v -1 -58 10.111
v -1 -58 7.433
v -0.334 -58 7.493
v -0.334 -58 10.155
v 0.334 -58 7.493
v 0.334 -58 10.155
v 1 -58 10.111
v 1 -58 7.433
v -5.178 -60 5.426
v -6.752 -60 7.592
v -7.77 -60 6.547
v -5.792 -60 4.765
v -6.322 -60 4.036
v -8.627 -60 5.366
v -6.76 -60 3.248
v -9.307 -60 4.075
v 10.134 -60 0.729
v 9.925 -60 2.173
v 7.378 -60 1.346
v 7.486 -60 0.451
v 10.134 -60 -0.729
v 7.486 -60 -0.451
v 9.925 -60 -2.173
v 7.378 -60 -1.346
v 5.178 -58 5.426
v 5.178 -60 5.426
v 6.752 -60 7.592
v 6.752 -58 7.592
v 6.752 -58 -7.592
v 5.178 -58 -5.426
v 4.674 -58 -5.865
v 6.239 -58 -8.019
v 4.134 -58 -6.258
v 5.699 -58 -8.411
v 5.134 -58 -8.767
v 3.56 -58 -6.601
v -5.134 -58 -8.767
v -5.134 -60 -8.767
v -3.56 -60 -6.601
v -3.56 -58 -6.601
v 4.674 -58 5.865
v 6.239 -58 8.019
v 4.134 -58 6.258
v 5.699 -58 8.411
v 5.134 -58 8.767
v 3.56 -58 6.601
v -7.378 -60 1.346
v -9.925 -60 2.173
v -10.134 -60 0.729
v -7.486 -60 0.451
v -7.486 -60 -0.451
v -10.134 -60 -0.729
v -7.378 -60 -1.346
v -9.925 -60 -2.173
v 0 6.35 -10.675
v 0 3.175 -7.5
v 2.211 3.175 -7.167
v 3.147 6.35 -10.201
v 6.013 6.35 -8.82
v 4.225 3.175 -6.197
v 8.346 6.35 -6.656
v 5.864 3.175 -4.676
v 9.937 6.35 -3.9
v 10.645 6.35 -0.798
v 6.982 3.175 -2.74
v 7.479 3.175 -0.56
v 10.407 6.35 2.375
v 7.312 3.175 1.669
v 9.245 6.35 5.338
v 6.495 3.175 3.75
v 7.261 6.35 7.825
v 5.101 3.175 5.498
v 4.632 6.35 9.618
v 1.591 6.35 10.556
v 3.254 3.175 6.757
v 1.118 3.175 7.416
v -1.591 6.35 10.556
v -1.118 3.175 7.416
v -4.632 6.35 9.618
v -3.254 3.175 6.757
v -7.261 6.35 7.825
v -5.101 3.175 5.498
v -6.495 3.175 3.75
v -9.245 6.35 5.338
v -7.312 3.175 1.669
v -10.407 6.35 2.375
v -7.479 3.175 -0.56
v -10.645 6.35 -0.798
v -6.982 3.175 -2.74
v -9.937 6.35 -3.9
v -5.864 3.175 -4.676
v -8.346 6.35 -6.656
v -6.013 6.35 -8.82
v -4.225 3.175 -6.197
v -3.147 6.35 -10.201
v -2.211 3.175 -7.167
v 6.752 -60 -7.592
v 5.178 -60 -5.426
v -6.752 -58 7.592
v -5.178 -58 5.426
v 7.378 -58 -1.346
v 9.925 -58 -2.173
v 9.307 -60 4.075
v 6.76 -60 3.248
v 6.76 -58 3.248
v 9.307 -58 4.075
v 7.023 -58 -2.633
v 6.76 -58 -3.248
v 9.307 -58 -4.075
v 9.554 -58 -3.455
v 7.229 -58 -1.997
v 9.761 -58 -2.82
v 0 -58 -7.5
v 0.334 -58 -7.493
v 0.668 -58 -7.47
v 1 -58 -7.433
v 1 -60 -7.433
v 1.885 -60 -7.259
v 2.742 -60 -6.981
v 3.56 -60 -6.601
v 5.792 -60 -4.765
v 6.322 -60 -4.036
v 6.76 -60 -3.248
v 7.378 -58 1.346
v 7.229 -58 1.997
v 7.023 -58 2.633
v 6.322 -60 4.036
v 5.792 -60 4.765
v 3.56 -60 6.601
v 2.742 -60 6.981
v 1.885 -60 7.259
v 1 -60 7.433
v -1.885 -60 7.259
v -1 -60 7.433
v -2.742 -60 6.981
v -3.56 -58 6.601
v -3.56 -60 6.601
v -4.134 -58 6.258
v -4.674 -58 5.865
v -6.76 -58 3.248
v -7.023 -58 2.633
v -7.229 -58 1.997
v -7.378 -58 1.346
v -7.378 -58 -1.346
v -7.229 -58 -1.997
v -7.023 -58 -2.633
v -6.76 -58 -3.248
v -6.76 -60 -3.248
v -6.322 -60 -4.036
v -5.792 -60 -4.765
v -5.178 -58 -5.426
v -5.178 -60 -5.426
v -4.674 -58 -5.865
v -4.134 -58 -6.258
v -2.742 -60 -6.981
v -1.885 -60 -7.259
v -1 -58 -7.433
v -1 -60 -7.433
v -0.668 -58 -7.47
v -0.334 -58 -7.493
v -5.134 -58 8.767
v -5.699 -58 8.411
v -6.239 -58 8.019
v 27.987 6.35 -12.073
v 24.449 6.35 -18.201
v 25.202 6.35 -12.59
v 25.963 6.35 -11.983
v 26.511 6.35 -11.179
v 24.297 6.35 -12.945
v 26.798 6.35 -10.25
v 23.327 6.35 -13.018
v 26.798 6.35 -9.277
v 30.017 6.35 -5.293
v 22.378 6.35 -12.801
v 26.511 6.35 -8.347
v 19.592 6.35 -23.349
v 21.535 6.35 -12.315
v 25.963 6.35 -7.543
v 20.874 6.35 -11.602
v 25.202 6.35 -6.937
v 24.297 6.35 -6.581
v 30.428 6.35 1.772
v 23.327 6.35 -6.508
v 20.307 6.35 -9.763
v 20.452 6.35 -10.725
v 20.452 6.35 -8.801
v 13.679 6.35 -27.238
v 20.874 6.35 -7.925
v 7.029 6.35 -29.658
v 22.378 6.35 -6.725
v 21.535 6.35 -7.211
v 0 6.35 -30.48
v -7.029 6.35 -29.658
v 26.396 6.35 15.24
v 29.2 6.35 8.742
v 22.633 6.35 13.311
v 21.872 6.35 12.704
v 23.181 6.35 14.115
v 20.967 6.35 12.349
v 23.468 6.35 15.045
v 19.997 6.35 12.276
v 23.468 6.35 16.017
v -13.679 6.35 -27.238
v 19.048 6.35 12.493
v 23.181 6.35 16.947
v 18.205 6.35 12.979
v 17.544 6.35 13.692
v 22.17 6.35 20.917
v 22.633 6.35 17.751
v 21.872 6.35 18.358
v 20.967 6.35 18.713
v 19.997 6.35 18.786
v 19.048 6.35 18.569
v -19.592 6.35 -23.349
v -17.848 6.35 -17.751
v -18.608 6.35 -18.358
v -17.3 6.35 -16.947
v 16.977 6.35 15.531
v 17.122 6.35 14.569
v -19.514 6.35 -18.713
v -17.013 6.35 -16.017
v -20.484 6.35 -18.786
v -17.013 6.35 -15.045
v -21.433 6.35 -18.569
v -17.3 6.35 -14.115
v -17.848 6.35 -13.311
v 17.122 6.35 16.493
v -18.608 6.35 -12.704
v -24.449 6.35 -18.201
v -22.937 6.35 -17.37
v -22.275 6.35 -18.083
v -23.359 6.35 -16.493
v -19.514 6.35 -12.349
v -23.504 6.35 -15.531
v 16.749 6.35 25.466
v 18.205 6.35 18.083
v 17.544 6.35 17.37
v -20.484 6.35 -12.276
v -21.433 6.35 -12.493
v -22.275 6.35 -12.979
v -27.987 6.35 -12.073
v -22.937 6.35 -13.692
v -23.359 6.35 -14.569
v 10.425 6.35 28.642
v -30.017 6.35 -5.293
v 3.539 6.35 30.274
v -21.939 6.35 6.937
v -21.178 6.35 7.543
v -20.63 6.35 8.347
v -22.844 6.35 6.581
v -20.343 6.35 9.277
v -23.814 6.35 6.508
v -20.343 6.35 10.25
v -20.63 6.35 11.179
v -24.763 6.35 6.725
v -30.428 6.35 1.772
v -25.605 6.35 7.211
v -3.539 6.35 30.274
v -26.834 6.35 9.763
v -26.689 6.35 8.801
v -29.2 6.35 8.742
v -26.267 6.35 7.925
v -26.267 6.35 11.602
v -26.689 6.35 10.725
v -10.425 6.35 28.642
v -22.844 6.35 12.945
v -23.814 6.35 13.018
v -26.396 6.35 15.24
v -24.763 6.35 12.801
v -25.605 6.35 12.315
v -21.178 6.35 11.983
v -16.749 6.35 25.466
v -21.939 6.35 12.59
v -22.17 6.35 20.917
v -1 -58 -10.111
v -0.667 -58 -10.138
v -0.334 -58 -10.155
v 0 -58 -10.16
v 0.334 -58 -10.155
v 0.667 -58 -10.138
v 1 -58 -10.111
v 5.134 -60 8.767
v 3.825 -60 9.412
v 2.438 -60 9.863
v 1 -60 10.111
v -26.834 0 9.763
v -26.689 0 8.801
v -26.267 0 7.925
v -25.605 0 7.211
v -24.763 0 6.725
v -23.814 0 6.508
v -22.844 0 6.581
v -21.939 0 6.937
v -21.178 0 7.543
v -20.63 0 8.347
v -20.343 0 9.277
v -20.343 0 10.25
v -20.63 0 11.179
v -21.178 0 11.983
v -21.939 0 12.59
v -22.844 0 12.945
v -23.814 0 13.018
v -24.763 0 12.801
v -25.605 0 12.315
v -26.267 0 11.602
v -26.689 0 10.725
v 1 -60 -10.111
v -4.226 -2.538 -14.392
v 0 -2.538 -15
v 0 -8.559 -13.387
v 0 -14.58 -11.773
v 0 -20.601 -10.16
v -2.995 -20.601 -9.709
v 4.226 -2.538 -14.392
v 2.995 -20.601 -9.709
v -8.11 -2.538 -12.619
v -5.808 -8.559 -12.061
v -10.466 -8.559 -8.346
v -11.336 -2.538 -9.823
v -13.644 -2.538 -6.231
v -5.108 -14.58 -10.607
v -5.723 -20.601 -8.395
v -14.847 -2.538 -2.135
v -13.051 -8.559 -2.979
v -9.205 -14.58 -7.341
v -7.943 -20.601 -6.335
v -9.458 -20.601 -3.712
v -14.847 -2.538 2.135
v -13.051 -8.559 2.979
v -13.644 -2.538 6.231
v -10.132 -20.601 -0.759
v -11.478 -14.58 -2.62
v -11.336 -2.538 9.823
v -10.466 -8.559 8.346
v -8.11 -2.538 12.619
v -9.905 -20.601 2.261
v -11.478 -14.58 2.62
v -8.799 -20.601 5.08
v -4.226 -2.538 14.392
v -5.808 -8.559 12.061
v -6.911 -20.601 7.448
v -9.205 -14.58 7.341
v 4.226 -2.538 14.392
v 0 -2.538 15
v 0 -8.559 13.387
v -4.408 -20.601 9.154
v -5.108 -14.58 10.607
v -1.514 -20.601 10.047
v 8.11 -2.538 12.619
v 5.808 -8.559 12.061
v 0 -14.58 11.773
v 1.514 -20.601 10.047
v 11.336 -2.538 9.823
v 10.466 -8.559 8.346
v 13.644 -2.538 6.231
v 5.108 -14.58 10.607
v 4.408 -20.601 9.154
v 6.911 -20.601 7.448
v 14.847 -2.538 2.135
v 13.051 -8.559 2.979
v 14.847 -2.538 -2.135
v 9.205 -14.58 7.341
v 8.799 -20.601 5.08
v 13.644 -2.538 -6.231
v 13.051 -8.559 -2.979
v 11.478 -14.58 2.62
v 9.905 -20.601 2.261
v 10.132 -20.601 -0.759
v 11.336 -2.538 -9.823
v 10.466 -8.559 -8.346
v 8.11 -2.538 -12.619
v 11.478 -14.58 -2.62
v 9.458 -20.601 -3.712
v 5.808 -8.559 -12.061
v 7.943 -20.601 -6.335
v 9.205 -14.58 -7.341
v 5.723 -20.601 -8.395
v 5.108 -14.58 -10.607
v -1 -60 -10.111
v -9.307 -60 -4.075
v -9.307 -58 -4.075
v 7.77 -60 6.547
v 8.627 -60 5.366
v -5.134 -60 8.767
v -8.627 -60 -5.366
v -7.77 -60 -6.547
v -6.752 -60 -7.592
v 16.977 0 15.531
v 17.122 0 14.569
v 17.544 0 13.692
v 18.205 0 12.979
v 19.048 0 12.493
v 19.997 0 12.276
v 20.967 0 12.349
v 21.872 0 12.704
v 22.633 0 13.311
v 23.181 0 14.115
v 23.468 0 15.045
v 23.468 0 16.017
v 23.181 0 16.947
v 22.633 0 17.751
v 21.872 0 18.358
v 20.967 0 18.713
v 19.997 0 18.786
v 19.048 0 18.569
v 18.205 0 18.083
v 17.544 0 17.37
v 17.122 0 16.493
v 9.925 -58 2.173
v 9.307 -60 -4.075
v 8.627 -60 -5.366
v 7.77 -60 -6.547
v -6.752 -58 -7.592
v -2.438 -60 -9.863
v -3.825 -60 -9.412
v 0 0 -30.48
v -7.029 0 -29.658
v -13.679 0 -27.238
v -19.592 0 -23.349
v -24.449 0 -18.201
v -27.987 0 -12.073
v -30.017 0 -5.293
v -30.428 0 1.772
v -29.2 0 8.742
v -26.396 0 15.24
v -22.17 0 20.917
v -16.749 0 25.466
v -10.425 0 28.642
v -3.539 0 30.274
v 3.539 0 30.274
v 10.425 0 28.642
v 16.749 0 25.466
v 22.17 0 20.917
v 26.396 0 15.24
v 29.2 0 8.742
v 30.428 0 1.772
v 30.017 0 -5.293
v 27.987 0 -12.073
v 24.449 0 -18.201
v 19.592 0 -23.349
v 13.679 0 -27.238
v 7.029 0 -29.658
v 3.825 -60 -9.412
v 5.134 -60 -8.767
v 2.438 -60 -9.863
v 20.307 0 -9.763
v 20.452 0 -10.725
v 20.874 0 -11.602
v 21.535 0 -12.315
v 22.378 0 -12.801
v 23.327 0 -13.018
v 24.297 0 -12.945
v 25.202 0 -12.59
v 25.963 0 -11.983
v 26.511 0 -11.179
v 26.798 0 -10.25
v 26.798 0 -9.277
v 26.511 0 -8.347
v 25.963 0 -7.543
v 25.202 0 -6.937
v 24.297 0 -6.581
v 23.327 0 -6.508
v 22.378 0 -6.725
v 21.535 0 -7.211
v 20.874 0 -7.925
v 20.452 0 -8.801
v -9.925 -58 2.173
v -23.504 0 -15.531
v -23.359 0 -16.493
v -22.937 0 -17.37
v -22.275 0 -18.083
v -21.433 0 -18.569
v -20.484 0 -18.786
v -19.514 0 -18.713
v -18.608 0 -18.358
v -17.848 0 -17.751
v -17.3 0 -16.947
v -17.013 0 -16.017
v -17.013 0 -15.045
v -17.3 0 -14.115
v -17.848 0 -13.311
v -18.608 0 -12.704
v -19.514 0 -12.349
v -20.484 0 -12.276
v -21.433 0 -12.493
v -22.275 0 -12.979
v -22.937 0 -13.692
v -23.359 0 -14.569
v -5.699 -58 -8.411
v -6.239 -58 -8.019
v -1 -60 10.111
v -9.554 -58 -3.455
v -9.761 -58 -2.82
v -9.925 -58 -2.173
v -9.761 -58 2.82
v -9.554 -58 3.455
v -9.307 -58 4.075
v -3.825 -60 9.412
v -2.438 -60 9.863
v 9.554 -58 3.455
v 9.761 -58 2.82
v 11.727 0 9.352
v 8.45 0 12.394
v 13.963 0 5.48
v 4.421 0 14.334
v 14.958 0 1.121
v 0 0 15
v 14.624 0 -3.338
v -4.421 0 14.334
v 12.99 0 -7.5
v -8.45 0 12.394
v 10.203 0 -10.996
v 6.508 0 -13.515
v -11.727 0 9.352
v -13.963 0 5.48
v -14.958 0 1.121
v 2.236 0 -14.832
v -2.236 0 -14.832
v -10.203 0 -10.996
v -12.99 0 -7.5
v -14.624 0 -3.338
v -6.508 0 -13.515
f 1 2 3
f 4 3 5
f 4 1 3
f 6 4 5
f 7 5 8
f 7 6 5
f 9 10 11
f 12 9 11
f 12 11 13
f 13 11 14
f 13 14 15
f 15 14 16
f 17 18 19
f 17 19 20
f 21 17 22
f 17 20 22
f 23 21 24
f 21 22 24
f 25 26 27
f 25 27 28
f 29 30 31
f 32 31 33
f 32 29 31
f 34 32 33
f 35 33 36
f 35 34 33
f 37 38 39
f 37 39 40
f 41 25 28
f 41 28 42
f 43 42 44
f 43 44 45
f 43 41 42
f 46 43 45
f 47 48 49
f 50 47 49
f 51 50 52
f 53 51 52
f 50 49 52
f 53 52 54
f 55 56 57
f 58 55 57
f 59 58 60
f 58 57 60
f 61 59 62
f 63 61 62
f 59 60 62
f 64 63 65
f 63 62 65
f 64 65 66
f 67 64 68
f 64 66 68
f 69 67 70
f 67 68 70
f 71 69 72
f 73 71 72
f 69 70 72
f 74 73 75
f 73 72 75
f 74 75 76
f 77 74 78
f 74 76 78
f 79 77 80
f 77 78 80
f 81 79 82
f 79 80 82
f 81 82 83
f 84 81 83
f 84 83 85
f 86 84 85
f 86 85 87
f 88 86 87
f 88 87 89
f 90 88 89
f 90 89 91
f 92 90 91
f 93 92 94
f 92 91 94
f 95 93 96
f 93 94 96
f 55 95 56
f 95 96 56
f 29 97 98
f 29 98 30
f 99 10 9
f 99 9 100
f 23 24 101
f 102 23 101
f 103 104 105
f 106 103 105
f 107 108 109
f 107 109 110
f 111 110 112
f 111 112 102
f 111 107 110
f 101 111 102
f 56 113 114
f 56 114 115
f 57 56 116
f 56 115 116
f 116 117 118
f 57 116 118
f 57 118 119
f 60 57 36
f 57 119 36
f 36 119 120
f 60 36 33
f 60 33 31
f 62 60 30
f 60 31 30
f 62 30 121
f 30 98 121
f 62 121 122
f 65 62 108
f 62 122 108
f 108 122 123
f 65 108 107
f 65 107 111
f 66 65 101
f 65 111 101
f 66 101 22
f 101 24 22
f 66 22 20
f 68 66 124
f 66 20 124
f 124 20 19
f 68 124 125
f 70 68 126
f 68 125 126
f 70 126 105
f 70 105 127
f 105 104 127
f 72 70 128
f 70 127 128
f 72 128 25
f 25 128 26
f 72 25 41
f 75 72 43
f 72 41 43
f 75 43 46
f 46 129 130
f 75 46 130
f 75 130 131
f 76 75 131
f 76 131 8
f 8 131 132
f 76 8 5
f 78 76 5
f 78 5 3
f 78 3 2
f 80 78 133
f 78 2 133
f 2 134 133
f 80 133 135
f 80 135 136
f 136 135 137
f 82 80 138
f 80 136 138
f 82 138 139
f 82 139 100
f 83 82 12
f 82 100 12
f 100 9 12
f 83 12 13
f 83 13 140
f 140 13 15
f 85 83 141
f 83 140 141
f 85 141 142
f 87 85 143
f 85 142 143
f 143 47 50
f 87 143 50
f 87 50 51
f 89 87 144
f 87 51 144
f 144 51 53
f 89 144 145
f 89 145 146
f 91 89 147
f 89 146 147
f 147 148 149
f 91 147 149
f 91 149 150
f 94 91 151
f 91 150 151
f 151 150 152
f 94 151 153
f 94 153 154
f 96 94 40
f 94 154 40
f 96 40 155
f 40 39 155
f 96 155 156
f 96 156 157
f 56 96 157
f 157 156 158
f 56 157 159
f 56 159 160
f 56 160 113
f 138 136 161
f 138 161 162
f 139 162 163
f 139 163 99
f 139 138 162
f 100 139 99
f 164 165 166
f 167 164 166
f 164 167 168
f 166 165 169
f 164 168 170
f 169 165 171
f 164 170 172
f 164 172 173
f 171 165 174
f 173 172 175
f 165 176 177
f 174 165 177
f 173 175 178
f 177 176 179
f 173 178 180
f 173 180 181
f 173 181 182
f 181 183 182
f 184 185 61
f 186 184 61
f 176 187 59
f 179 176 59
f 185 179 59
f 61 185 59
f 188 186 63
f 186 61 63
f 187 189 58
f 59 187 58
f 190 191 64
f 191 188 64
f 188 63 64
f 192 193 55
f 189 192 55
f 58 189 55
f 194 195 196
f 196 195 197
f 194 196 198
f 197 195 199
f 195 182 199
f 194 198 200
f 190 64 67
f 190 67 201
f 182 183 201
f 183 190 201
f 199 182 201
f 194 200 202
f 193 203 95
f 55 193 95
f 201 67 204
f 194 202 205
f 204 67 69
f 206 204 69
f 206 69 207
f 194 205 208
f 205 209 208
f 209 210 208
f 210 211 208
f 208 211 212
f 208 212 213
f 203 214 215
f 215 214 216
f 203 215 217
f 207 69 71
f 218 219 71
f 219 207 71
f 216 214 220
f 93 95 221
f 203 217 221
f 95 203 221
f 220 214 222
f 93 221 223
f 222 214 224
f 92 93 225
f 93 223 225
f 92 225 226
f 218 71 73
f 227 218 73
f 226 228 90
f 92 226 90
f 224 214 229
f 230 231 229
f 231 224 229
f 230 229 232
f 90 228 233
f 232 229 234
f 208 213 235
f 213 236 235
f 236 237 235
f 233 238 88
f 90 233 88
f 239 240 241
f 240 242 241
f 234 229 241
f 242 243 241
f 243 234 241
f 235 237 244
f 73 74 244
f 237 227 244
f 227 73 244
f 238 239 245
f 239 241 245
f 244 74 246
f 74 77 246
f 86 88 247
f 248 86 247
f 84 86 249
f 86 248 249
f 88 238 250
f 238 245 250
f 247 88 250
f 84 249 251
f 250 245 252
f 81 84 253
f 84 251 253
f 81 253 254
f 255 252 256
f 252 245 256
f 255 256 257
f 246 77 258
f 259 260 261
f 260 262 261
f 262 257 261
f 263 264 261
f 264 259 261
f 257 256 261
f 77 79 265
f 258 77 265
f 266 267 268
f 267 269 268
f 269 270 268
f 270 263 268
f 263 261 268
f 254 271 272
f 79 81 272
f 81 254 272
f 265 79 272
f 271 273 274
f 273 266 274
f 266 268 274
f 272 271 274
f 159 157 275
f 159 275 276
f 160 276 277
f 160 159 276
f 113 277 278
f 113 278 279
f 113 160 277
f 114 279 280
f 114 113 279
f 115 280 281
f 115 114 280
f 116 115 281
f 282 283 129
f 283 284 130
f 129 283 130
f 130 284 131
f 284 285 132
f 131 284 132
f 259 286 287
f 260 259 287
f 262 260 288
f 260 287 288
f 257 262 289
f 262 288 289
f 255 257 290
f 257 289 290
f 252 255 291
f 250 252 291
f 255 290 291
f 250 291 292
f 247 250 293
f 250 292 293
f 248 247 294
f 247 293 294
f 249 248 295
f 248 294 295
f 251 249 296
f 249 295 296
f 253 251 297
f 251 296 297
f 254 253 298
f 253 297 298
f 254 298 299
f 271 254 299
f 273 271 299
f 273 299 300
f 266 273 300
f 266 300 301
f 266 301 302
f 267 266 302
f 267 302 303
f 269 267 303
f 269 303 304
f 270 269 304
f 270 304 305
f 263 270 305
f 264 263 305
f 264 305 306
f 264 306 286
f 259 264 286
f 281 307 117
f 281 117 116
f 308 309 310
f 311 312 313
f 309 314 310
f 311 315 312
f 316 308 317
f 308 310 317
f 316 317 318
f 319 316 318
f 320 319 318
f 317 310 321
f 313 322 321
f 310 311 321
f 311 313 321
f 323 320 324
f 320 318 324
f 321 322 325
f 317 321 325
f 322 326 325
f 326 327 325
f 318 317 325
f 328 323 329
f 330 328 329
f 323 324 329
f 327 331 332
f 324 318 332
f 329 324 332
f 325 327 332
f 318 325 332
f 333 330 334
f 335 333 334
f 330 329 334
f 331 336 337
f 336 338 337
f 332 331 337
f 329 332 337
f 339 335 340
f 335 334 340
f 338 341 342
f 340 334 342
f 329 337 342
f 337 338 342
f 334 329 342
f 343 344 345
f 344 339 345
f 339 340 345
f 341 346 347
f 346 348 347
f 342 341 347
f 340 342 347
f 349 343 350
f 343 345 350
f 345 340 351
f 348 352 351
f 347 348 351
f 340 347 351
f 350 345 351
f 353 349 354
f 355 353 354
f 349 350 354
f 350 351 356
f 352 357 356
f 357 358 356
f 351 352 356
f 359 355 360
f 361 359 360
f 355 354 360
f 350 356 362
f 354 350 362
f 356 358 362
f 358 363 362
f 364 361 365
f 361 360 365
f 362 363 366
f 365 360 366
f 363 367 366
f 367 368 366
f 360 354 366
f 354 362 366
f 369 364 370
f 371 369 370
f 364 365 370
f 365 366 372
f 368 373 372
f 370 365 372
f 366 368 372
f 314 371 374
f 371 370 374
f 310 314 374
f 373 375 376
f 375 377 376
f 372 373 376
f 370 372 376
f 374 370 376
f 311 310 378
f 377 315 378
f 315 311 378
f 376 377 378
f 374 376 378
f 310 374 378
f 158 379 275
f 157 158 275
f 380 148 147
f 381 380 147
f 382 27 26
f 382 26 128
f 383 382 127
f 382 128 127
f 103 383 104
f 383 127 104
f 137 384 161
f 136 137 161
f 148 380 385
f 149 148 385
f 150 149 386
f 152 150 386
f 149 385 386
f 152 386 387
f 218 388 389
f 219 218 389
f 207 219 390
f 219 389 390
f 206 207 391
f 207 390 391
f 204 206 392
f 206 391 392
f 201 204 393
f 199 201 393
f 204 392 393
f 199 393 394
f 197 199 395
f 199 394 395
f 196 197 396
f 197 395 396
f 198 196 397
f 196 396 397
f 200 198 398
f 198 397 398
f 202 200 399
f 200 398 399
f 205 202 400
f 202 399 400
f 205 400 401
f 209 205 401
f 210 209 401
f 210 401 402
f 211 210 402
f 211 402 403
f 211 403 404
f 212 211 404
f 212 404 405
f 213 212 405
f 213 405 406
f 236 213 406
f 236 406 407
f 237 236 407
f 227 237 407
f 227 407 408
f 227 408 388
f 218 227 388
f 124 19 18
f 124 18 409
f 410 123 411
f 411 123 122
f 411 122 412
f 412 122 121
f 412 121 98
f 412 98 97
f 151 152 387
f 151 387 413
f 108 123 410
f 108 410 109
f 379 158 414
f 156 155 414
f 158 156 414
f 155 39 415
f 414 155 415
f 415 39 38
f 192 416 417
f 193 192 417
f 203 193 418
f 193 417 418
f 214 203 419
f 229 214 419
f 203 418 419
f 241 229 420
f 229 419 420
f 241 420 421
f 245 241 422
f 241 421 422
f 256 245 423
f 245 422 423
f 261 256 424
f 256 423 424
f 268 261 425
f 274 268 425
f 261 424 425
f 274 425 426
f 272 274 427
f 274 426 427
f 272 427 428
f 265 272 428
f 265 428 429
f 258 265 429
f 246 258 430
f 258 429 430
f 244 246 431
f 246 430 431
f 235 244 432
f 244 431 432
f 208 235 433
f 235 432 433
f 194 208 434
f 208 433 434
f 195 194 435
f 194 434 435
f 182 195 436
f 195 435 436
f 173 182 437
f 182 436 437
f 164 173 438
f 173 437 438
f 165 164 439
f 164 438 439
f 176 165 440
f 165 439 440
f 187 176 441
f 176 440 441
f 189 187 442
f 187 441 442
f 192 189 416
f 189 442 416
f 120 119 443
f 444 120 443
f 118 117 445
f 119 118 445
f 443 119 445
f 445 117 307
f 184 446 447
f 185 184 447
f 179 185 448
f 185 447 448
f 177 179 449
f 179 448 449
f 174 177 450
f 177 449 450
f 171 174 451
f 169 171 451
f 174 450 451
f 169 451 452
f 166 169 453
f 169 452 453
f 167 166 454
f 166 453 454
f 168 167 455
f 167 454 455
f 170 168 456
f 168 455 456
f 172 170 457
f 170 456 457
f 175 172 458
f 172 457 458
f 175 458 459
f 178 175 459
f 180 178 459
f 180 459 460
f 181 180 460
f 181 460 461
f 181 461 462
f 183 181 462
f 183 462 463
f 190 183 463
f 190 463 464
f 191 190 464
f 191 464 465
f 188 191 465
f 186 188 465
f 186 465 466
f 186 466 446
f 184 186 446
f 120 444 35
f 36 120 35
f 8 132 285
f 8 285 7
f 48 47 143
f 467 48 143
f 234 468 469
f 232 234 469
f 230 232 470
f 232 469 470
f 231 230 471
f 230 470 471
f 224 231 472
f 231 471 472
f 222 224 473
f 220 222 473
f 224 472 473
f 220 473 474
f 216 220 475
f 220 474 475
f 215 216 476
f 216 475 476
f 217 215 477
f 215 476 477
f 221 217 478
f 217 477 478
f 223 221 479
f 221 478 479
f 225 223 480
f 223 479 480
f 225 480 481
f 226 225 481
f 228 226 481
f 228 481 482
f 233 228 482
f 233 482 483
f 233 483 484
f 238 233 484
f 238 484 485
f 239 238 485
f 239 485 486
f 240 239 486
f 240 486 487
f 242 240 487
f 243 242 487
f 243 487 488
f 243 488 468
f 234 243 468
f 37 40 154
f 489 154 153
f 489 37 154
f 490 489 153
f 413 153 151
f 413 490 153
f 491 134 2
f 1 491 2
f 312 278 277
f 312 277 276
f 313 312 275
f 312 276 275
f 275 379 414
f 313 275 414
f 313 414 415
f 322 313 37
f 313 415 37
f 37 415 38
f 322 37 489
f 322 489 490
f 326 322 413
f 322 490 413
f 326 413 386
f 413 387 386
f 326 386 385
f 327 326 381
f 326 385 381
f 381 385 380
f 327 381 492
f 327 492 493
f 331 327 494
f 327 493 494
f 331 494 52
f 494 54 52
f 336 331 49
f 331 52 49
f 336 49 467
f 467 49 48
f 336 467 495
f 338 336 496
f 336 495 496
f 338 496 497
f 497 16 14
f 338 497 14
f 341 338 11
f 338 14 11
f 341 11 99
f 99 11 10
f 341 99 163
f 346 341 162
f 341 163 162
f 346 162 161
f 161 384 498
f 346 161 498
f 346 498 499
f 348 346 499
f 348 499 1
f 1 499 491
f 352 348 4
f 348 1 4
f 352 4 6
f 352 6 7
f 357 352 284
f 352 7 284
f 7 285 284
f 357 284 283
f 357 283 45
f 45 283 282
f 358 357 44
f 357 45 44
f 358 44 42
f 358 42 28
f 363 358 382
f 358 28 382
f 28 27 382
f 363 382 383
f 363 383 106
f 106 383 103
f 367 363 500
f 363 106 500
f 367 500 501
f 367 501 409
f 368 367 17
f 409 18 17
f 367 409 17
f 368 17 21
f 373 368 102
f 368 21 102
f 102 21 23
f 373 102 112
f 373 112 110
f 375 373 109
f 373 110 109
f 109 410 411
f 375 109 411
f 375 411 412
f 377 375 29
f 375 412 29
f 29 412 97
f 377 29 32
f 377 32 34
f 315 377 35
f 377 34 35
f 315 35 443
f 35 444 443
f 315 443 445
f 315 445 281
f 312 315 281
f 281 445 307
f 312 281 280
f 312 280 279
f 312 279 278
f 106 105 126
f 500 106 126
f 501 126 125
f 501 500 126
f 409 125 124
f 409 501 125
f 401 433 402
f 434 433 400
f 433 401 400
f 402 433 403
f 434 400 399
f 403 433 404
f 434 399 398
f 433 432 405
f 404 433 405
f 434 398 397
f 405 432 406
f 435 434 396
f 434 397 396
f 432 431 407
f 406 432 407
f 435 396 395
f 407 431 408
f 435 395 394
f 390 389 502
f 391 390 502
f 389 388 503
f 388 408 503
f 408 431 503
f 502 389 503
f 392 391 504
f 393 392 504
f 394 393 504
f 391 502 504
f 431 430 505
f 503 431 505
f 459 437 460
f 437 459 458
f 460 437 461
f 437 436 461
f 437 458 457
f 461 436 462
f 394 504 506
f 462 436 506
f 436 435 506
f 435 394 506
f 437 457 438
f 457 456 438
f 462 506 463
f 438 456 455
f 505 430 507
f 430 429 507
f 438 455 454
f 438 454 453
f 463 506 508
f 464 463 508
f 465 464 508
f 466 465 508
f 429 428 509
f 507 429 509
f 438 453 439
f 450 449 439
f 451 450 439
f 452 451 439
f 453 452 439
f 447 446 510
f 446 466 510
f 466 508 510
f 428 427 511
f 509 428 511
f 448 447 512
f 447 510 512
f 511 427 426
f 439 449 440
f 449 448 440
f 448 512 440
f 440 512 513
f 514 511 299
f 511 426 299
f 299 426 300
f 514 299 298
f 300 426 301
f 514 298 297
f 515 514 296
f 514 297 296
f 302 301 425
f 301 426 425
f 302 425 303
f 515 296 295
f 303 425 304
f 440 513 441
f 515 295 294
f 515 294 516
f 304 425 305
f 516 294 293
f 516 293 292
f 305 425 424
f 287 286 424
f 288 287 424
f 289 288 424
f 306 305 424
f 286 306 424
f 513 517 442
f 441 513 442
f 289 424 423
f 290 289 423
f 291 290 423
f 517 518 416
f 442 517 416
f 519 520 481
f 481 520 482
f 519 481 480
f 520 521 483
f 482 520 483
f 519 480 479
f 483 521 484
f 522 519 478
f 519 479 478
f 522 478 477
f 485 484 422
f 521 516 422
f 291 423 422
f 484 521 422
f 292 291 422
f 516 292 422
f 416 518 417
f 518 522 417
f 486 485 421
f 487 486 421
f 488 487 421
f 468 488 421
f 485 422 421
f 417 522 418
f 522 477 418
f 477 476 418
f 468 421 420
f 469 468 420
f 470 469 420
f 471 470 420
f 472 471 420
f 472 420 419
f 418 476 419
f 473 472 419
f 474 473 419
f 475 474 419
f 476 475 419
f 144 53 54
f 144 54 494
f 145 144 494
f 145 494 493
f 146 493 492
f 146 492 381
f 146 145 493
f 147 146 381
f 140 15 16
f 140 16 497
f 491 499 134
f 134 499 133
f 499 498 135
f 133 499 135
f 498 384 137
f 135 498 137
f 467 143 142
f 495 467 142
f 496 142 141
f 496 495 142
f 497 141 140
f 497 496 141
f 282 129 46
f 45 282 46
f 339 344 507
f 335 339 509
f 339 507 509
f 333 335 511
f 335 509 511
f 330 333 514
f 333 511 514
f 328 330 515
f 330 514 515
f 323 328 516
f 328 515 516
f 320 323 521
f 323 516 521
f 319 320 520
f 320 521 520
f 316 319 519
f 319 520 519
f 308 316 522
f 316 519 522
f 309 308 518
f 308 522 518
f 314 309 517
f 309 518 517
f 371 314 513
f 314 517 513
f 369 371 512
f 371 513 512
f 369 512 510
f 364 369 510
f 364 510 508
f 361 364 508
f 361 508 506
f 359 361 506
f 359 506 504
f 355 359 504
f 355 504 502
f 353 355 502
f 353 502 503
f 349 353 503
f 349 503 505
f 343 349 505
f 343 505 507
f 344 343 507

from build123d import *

# Parameters (mm, degrees)
SKETCH5_R                   = 7.5
CUT_EXTRUDE1_DEPTH          = 90
SKETCH6_R                   = 3.5
CUT_EXTRUDE2_DEPTH          = 20
CIRPATTERN1_COUNT           = 6
SKETCH11_R                  = 3.18
CUT_EXTRUDE4_DEPTH          = 101.105860558
SKETCH23_R                  = 30.48
CUT_EXTRUDE6_DEPTH          = 80.122584091
F_1_4_CLEARANCE_HOLE1_D     = 6.5278
F_1_4_CLEARANCE_HOLE1_DEPTH = 15.4203
F_1_4_CLEARANCE_HOLE1_TIP   = 1.961148974
CHAMFER1_SIZE               = 3.175
SKETCH26_OUTSIDE_W          = 84.718
SKETCH26_OUTSIDE_H          = 84.718
SKETCH26_OUTSIDE_R          = 15
FOR_TURNING_EASE_DEPTH      = 74.878689756
SKETCH29_W                  = 2
SKETCH29_H                  = 2
CUT_EXTRUDE7_DEPTH          = 74.878689756
CIRPATTERN4_COUNT           = 5


with BuildPart() as part:
    # Sketch1 → Revolve1 (revolve)
    with BuildSketch(Plane(origin=(0, 0, 0), x_dir=(0, 0, -1), z_dir=(1, 0, 0))):
        Polygon((0, 30.35), (12.7, 30.35), (12.7, 6.35), (30.48, 6.35), (30.48, 0), (15.68, 0), (10.16, -20.600920458), (10.16, -60), (0, -60), align=None)
    revolve(axis=Axis((0, 0, 0), (0, 1, 0)))

    # Sketch5 → Cut-Extrude1 (cut)
    with BuildSketch(Plane.XZ.offset(60)):
        Circle(SKETCH5_R)
    extrude(amount=-CUT_EXTRUDE1_DEPTH, mode=Mode.SUBTRACT)

    # Sketch6 → Cut-Extrude2 (cut, symmetric)
    with BuildSketch(Plane.XY):
        with Locations((0, 16.659966967)):
            Circle(SKETCH6_R)
    cut_extrude2 = extrude(amount=CUT_EXTRUDE2_DEPTH, both=True, mode=Mode.SUBTRACT)

    # CirPattern1: Cut-Extrude2 ×6 about axis
    cirpattern1_axis = Axis((0, 30.35, 0), (0, -1, 0))
    for i in range(1, CIRPATTERN1_COUNT):
        add(cut_extrude2.rotate(cirpattern1_axis, i * 360 / CIRPATTERN1_COUNT), mode=Mode.SUBTRACT)

    # Sketch11 → Cut-Extrude4 (cut, through all)
    with BuildSketch(Plane(origin=(0, 30.35, 0), x_dir=(1, 0, 0), z_dir=(0, 1, 0))):
        Circle(SKETCH11_R)
    extrude(amount=-CUT_EXTRUDE4_DEPTH, mode=Mode.SUBTRACT)

    # Sketch23 → Cut-Extrude6 (cut, through all)
    with BuildSketch(Plane(origin=(0, 6.35, 0), x_dir=(1, 0, 0), z_dir=(0, 1, 0))):
        Circle(SKETCH23_R)
    extrude(amount=CUT_EXTRUDE6_DEPTH, mode=Mode.SUBTRACT)

    # 1/4 Clearance Hole1
    with Locations(Plane(origin=(0, 6.35, 0), x_dir=(1, 0, 0), z_dir=(0, 1, 0))):
        with Locations((-20.240427094, 15.531025958), (23.570476573, 9.763211068), (20.240427094, -15.531025958), (-23.570476573, -9.763211068)):
            Hole(F_1_4_CLEARANCE_HOLE1_D / 2, depth=F_1_4_CLEARANCE_HOLE1_DEPTH)
            with Locations((0, 0, -(F_1_4_CLEARANCE_HOLE1_DEPTH + F_1_4_CLEARANCE_HOLE1_TIP / 2))):  # 118° drill point
                Cone(0, F_1_4_CLEARANCE_HOLE1_D / 2, F_1_4_CLEARANCE_HOLE1_TIP, mode=Mode.SUBTRACT)

    # Chamfer1
    chamfer1_edges = [part.edges().sort_by_distance(p)[0] for p in [
        (-7.5, 6.35, 0),
    ]]
    chamfer(chamfer1_edges, length=CHAMFER1_SIZE)

    # Sketch26 outside → for-turning-ease (cut, through all)
    with BuildSketch(Plane.XZ):
        Rectangle(SKETCH26_OUTSIDE_W, SKETCH26_OUTSIDE_H)
        Circle(SKETCH26_OUTSIDE_R, mode=Mode.SUBTRACT)
    extrude(amount=FOR_TURNING_EASE_DEPTH, mode=Mode.SUBTRACT)

    # Sketch29 → Cut-Extrude7 (cut, symmetric)
    with BuildSketch(Plane.XY):
        with Locations((0, -59)):
            Rectangle(SKETCH29_W, SKETCH29_H)
    cut_extrude7 = extrude(amount=CUT_EXTRUDE7_DEPTH, both=True, mode=Mode.SUBTRACT)

    # CirPattern4: Cut-Extrude7 ×5 about axis
    cirpattern4_axis = Axis((0, -60, 0), (0, -1, 0))
    for i in range(1, CIRPATTERN4_COUNT):
        add(cut_extrude7.rotate(cirpattern4_axis, i * 360 / CIRPATTERN4_COUNT), mode=Mode.SUBTRACT)


solid = part.part
